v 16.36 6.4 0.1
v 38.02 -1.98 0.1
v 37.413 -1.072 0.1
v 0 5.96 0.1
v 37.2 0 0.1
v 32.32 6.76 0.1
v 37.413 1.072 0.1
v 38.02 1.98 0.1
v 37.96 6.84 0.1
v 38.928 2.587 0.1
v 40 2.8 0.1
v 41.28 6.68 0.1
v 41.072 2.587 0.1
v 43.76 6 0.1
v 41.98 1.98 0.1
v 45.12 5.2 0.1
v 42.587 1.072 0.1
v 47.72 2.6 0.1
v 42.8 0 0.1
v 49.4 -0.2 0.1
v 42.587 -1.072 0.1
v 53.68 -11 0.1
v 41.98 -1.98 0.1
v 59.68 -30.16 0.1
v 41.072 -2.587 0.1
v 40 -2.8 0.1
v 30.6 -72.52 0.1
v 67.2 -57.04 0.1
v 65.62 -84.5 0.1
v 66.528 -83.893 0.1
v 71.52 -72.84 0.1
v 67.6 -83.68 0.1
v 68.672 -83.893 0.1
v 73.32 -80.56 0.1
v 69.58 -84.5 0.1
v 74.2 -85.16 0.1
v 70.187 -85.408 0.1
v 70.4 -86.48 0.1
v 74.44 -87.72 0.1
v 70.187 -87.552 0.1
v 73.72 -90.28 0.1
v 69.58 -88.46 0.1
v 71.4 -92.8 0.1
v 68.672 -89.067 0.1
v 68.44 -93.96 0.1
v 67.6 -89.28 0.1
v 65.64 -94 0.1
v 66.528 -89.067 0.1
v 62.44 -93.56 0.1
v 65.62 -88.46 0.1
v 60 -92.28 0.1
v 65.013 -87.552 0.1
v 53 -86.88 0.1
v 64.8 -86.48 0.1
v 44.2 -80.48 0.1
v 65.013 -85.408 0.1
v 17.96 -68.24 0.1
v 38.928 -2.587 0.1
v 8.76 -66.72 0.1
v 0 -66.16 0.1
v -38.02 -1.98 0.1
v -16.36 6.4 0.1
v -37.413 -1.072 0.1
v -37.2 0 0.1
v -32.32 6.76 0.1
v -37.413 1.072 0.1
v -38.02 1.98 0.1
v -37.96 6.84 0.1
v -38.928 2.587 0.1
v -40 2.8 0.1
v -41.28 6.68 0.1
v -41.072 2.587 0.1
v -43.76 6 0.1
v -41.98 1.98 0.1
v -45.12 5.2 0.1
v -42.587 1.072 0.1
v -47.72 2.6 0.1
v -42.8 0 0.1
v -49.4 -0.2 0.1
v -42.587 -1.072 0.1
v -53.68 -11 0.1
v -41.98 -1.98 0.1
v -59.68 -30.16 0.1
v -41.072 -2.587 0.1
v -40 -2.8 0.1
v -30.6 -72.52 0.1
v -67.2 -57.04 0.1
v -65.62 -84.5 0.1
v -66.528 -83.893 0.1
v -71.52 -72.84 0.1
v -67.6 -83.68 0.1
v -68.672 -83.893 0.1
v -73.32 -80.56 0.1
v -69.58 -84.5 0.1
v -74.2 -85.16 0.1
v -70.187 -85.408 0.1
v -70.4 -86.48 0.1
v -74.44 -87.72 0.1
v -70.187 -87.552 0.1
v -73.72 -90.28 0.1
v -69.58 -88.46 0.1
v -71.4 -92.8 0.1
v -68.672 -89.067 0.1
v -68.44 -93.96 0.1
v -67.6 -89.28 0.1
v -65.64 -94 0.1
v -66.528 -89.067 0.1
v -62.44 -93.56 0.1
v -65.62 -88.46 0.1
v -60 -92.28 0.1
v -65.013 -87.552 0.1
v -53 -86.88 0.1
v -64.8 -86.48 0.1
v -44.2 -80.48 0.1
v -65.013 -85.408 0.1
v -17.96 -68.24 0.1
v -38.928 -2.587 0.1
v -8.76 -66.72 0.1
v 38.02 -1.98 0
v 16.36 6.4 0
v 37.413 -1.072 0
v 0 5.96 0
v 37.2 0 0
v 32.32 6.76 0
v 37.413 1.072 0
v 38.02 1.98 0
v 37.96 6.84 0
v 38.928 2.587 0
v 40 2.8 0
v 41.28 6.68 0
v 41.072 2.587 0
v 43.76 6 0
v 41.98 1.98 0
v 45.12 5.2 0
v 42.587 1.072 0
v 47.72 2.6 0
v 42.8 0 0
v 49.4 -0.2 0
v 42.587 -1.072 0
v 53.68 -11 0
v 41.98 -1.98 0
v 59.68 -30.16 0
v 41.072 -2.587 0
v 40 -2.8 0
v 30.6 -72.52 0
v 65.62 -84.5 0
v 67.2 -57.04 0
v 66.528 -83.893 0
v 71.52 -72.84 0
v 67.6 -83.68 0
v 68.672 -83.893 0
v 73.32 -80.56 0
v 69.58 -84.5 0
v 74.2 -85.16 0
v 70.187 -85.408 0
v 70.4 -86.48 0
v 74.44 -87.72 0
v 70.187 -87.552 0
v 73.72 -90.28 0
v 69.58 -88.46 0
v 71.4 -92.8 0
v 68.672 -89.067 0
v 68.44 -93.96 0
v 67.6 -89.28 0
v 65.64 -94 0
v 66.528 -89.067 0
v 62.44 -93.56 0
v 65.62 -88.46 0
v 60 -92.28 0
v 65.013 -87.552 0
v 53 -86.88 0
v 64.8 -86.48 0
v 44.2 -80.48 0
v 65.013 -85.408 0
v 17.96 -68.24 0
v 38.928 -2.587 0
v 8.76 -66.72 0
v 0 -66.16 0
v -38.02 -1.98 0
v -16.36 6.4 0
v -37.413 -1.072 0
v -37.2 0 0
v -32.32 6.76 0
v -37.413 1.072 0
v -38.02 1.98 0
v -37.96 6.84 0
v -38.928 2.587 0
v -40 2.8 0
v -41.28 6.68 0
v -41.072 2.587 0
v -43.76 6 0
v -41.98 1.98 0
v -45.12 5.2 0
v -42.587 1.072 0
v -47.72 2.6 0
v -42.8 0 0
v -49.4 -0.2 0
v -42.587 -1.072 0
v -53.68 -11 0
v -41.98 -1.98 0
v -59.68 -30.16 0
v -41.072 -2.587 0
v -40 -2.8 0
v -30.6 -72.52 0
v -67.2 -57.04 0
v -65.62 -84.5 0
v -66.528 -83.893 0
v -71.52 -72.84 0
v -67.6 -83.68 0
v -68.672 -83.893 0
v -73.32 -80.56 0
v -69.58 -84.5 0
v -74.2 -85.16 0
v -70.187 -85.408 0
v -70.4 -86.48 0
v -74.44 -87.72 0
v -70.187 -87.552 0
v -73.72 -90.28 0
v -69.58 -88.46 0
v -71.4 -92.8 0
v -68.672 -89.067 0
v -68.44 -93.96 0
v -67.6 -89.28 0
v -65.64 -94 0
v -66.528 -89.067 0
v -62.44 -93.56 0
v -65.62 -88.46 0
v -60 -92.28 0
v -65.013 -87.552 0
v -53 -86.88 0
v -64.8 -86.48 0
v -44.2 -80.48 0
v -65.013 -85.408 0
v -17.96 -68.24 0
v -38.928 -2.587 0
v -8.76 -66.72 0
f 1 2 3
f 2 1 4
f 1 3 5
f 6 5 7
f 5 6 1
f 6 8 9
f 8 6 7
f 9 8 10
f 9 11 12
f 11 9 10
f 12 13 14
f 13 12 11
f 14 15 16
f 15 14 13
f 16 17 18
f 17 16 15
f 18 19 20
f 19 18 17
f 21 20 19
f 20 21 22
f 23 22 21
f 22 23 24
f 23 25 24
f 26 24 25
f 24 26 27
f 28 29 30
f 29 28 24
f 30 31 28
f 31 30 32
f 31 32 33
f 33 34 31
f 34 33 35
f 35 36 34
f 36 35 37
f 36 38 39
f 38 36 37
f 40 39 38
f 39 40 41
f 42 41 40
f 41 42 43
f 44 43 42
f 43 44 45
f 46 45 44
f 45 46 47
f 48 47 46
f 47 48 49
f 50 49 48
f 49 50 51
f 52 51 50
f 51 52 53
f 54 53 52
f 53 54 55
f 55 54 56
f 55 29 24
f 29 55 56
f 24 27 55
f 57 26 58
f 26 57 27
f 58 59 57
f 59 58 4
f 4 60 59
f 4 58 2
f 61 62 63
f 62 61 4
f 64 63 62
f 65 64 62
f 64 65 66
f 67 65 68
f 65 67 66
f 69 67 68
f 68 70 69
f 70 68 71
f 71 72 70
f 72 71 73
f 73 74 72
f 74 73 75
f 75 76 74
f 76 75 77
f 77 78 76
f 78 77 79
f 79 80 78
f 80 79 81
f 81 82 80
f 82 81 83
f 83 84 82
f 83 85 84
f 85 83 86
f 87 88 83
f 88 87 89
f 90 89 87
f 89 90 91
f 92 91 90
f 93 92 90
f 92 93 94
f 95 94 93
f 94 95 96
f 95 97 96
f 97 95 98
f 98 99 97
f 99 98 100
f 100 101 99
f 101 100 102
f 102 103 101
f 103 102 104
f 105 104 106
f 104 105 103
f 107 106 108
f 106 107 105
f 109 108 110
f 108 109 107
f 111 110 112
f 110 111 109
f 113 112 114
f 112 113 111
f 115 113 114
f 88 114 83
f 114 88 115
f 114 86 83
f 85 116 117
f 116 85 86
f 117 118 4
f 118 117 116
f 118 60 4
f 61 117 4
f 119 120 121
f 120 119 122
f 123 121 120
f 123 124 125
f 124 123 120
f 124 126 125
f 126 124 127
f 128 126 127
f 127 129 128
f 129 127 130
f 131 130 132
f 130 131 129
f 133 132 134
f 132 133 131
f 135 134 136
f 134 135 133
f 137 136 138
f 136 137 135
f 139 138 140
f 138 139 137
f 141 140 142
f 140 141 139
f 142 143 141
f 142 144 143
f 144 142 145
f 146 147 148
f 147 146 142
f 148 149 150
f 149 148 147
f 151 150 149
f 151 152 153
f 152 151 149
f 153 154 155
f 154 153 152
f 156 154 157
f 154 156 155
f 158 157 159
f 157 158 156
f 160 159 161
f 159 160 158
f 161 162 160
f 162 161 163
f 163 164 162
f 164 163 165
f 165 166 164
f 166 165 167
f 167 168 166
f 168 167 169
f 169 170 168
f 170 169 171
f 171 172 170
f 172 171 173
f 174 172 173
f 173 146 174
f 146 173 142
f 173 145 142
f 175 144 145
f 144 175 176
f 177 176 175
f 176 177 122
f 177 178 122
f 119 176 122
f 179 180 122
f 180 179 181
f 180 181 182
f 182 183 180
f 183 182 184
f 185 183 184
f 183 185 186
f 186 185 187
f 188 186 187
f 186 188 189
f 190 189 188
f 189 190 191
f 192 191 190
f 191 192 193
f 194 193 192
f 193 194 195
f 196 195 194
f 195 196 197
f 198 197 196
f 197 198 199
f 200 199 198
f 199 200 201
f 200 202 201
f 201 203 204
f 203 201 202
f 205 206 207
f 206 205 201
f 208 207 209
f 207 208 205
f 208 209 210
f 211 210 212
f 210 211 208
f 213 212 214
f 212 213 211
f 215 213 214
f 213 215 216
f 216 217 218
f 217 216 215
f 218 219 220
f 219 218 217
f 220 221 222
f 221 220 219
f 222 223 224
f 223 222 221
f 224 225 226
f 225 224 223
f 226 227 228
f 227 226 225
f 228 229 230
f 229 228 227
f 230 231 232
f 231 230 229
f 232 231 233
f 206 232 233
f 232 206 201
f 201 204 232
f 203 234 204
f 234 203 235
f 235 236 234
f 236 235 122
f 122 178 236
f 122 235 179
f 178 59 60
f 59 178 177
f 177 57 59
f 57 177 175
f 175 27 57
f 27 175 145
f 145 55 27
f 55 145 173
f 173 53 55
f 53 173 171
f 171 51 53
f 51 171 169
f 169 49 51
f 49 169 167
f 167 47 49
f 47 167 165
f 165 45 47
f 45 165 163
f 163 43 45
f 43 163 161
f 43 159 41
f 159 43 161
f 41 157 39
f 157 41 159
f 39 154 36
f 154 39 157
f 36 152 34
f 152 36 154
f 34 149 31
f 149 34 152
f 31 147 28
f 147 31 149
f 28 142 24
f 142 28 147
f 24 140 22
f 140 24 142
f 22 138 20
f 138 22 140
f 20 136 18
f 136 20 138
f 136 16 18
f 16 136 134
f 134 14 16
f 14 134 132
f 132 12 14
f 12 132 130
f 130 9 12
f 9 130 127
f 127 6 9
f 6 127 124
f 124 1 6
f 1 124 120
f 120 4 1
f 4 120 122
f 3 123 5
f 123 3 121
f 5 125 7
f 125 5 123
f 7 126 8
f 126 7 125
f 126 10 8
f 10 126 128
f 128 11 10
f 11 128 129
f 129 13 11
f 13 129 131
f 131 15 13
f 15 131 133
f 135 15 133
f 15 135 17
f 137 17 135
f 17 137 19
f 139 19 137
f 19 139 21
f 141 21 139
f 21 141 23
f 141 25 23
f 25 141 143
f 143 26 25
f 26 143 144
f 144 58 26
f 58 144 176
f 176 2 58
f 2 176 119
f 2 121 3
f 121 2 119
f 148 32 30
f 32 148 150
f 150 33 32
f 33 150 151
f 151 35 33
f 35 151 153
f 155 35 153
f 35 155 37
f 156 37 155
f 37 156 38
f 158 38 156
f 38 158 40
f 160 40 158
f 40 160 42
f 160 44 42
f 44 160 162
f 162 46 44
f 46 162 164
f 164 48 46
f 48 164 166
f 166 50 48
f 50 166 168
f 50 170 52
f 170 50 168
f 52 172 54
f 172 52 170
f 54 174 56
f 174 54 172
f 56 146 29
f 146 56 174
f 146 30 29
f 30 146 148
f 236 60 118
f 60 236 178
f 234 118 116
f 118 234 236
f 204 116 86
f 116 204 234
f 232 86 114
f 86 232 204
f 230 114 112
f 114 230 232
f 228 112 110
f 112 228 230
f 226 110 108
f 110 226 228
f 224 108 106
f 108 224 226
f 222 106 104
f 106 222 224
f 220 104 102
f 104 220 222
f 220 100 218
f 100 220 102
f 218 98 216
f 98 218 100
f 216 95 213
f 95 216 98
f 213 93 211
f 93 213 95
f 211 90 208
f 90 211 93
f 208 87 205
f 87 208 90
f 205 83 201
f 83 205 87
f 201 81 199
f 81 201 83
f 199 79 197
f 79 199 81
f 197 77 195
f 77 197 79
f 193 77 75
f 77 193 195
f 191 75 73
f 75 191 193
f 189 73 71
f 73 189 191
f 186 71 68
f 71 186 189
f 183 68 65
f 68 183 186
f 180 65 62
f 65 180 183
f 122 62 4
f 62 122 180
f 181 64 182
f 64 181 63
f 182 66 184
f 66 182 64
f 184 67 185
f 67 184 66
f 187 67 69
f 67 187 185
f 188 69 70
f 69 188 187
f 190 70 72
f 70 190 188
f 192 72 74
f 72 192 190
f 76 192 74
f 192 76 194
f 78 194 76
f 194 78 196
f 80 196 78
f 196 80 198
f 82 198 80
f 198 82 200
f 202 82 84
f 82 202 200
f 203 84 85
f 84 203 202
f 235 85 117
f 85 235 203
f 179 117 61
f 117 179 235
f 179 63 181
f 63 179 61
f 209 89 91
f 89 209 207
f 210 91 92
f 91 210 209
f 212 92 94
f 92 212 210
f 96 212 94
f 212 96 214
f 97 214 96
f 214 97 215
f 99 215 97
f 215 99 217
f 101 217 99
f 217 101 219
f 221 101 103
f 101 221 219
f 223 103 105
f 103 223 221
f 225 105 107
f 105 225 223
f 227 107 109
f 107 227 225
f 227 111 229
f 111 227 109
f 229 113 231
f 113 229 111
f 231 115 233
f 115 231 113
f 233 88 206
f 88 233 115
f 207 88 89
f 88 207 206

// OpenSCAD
use <../lib.scad>
use <s/96714s01.scad>
use <s/96714s02.scad>
function ldraw_lib__96714() = [
// 0 Sheet Fabric 17.5 x 12.5 Trapezoidal Sail
// 0 Name: 96714.dat
// 0 Author: Philippe Hurbain [Philo]
// 0 !LDRAW_ORG Part UPDATE 2020-02
// 0 !LICENSE Licensed under CC BY 2.0 and CC BY 4.0 : see CAreadme.txt
// 
// 0 BFC CERTIFY CCW
  [0,"BFC","CERTIFY"],
  [0,"BFC","CCW"],
// 
// 0 !CATEGORY Sheet Fabric
// 0 !KEYWORDS Black Pearl, set 4184
// 
// 0 !HISTORY 2014-12-23 [PTadmin] Official Update 2014-02
// 0 !HISTORY 2019-01-25 [cwdee] Update category
// 0 !HISTORY 2019-06-28 [PTadmin] Official Update 2019-01
// 0 !HISTORY 2020-06-10 [cwdee] Update description
// 0 !HISTORY 2020-09-05 [PTadmin] Official Update 2020-02
// 
// 
// 1 16 0 -0.25 0 1 0 0 0 1 0 0 0 1 s\96714s01.dat
  [1,16,0,-0.25,0,1,0,0,0,1,0,0,0,1, ldraw_lib__s__96714s01()],
// 1 16 0 -0.25 0 -1 0 0 0 1 0 0 0 1 s\96714s01.dat
  [1,16,0,-0.25,0,-1,0,0,0,1,0,0,0,1, ldraw_lib__s__96714s01()],
// 1 16 0 0 0 1 0 0 0 -1 0 0 0 1 s\96714s01.dat
  [1,16,0,0,0,1,0,0,0,-1,0,0,0,1, ldraw_lib__s__96714s01()],
// 1 16 0 0 0 -1 0 0 0 -1 0 0 0 1 s\96714s01.dat
  [1,16,0,0,0,-1,0,0,0,-1,0,0,0,1, ldraw_lib__s__96714s01()],
// 1 16 0 0 0 1 0 0 0 1 0 0 0 1 s\96714s02.dat
  [1,16,0,0,0,1,0,0,0,1,0,0,0,1, ldraw_lib__s__96714s02()],
// 1 16 0 0 0 -1 0 0 0 1 0 0 0 1 s\96714s02.dat
  [1,16,0,0,0,-1,0,0,0,1,0,0,0,1, ldraw_lib__s__96714s02()],
];
makepoly(ldraw_lib__96714(), line=0.2);
